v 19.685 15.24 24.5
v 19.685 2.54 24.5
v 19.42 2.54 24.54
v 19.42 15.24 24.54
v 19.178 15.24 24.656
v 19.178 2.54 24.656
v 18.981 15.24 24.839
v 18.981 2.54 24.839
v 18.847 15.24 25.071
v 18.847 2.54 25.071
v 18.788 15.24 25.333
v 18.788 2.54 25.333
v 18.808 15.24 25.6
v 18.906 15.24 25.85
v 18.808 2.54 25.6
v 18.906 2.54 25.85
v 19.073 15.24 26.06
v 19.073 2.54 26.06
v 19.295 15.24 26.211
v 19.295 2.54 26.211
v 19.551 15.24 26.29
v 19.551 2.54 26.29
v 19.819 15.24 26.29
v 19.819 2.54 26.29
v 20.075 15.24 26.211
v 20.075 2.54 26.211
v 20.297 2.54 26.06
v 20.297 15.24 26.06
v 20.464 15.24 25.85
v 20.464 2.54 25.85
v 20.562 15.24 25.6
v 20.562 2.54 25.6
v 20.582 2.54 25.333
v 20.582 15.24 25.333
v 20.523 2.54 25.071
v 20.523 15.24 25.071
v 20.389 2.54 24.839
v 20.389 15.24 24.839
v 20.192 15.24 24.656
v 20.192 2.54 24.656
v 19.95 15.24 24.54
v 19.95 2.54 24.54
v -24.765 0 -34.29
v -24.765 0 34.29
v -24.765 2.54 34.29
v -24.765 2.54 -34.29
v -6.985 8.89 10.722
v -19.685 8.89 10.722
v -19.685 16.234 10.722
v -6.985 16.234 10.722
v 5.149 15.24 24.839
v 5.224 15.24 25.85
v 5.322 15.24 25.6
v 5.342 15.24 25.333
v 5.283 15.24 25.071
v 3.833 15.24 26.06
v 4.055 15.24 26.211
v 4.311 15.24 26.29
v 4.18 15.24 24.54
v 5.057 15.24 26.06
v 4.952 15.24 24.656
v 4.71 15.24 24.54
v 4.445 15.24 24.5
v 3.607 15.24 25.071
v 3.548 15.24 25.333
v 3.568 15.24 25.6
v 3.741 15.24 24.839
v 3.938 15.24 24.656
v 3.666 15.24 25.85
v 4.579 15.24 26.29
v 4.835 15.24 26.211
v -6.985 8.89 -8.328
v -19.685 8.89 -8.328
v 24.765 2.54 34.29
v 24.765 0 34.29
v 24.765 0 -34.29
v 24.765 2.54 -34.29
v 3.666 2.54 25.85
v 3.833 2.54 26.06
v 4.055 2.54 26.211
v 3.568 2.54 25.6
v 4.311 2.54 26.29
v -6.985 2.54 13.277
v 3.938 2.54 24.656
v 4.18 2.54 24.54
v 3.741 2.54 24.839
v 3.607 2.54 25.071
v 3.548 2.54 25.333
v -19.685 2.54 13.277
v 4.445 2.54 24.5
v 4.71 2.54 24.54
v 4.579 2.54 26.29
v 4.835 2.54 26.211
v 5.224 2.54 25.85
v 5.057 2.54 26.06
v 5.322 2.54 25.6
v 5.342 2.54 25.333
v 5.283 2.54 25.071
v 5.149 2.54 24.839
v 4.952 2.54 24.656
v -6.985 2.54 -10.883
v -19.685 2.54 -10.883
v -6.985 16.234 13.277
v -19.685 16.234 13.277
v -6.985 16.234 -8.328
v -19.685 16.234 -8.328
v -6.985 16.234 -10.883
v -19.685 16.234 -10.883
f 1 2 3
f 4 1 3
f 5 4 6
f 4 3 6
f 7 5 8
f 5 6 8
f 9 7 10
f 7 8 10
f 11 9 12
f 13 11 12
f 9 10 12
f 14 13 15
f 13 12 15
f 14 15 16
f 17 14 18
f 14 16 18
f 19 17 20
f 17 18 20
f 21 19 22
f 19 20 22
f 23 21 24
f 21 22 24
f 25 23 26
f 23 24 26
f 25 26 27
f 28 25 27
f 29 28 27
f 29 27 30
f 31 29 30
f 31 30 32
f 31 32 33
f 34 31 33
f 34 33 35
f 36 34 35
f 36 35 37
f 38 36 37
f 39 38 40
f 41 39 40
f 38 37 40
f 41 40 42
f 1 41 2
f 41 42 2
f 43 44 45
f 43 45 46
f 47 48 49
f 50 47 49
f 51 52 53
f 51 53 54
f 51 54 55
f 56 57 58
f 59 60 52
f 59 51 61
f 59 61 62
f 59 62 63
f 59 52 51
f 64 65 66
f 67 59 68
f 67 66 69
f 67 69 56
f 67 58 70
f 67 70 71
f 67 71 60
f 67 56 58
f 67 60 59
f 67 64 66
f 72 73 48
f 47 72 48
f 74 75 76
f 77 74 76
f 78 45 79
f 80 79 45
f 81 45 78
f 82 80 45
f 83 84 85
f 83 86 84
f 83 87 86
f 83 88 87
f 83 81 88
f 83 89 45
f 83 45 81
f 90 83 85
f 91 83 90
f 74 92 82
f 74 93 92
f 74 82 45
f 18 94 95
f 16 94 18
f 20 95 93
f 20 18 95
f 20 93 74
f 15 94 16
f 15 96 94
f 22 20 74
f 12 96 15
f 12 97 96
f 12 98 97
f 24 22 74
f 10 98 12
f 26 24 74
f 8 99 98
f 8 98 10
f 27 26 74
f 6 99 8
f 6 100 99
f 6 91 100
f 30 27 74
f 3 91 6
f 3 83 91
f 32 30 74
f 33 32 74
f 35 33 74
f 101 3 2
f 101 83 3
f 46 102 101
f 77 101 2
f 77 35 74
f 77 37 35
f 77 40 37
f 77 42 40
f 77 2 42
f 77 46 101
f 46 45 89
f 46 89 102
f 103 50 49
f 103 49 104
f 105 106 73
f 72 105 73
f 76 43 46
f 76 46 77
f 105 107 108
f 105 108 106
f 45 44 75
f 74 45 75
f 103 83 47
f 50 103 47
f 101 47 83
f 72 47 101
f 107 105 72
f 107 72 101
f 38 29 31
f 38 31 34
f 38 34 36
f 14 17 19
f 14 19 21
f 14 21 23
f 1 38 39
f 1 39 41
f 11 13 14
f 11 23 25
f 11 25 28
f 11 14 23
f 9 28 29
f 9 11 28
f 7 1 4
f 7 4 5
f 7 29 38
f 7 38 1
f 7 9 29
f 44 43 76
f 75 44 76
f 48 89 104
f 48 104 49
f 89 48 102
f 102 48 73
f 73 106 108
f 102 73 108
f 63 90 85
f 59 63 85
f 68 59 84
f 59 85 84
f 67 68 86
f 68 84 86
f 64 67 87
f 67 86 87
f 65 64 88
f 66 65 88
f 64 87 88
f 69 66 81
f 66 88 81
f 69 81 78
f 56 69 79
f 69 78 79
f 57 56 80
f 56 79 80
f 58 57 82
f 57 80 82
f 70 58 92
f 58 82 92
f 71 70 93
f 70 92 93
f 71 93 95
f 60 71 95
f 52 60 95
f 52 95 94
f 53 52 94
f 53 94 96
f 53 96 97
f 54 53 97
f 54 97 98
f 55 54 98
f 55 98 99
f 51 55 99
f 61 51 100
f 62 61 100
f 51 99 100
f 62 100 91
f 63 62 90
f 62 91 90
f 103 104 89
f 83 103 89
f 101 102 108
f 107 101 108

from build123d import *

# Parameters (mm, degrees)
SKETCH1_W           = 49.53
SKETCH1_H           = 68.58
BOSS_EXTRUDE1_DEPTH = 2.54
SKETCH3_R           = 0.9
BOSS_EXTRUDE3_DEPTH = 12.7
BOSS_EXTRUDE4_START = -5.08
BOSS_EXTRUDE4_DEPTH = 12.7


with BuildPart() as part:
    # Sketch1 → Boss-Extrude1 (new body)
    with BuildSketch(Plane(origin=(0, 0, 0), x_dir=(1, 0, 0), z_dir=(0, 1, 0))):
        Rectangle(SKETCH1_W, SKETCH1_H)
    extrude(amount=BOSS_EXTRUDE1_DEPTH)

    # Sketch3 → Boss-Extrude3 (add)
    with BuildSketch(Plane(origin=(0, 2.54, 0), x_dir=(1, 0, 0), z_dir=(0, 1, 0))):
        with Locations(Location((4.445, -25.4, 0), (0, 0, 90))):
            Circle(SKETCH3_R)
        with Locations(Location((19.685, -25.4, 0), (0, 0, 90))):
            Circle(SKETCH3_R)
    extrude(amount=BOSS_EXTRUDE3_DEPTH)

    # Sketch4 → Boss-Extrude4 (add)
    with BuildSketch(Plane.ZY.offset(24.765).offset(BOSS_EXTRUDE4_START)):
        Polygon((-10.882960378, 2.54), (-10.882960378, 16.234305586), (-8.32780624, 16.234305586), (-8.32780624, 8.89), (10.72219376, 8.89), (10.72219376, 16.234305586), (13.277347899, 16.234305586), (13.277347899, 2.54), align=None)
    extrude(amount=-BOSS_EXTRUDE4_DEPTH)


solid = part.part
